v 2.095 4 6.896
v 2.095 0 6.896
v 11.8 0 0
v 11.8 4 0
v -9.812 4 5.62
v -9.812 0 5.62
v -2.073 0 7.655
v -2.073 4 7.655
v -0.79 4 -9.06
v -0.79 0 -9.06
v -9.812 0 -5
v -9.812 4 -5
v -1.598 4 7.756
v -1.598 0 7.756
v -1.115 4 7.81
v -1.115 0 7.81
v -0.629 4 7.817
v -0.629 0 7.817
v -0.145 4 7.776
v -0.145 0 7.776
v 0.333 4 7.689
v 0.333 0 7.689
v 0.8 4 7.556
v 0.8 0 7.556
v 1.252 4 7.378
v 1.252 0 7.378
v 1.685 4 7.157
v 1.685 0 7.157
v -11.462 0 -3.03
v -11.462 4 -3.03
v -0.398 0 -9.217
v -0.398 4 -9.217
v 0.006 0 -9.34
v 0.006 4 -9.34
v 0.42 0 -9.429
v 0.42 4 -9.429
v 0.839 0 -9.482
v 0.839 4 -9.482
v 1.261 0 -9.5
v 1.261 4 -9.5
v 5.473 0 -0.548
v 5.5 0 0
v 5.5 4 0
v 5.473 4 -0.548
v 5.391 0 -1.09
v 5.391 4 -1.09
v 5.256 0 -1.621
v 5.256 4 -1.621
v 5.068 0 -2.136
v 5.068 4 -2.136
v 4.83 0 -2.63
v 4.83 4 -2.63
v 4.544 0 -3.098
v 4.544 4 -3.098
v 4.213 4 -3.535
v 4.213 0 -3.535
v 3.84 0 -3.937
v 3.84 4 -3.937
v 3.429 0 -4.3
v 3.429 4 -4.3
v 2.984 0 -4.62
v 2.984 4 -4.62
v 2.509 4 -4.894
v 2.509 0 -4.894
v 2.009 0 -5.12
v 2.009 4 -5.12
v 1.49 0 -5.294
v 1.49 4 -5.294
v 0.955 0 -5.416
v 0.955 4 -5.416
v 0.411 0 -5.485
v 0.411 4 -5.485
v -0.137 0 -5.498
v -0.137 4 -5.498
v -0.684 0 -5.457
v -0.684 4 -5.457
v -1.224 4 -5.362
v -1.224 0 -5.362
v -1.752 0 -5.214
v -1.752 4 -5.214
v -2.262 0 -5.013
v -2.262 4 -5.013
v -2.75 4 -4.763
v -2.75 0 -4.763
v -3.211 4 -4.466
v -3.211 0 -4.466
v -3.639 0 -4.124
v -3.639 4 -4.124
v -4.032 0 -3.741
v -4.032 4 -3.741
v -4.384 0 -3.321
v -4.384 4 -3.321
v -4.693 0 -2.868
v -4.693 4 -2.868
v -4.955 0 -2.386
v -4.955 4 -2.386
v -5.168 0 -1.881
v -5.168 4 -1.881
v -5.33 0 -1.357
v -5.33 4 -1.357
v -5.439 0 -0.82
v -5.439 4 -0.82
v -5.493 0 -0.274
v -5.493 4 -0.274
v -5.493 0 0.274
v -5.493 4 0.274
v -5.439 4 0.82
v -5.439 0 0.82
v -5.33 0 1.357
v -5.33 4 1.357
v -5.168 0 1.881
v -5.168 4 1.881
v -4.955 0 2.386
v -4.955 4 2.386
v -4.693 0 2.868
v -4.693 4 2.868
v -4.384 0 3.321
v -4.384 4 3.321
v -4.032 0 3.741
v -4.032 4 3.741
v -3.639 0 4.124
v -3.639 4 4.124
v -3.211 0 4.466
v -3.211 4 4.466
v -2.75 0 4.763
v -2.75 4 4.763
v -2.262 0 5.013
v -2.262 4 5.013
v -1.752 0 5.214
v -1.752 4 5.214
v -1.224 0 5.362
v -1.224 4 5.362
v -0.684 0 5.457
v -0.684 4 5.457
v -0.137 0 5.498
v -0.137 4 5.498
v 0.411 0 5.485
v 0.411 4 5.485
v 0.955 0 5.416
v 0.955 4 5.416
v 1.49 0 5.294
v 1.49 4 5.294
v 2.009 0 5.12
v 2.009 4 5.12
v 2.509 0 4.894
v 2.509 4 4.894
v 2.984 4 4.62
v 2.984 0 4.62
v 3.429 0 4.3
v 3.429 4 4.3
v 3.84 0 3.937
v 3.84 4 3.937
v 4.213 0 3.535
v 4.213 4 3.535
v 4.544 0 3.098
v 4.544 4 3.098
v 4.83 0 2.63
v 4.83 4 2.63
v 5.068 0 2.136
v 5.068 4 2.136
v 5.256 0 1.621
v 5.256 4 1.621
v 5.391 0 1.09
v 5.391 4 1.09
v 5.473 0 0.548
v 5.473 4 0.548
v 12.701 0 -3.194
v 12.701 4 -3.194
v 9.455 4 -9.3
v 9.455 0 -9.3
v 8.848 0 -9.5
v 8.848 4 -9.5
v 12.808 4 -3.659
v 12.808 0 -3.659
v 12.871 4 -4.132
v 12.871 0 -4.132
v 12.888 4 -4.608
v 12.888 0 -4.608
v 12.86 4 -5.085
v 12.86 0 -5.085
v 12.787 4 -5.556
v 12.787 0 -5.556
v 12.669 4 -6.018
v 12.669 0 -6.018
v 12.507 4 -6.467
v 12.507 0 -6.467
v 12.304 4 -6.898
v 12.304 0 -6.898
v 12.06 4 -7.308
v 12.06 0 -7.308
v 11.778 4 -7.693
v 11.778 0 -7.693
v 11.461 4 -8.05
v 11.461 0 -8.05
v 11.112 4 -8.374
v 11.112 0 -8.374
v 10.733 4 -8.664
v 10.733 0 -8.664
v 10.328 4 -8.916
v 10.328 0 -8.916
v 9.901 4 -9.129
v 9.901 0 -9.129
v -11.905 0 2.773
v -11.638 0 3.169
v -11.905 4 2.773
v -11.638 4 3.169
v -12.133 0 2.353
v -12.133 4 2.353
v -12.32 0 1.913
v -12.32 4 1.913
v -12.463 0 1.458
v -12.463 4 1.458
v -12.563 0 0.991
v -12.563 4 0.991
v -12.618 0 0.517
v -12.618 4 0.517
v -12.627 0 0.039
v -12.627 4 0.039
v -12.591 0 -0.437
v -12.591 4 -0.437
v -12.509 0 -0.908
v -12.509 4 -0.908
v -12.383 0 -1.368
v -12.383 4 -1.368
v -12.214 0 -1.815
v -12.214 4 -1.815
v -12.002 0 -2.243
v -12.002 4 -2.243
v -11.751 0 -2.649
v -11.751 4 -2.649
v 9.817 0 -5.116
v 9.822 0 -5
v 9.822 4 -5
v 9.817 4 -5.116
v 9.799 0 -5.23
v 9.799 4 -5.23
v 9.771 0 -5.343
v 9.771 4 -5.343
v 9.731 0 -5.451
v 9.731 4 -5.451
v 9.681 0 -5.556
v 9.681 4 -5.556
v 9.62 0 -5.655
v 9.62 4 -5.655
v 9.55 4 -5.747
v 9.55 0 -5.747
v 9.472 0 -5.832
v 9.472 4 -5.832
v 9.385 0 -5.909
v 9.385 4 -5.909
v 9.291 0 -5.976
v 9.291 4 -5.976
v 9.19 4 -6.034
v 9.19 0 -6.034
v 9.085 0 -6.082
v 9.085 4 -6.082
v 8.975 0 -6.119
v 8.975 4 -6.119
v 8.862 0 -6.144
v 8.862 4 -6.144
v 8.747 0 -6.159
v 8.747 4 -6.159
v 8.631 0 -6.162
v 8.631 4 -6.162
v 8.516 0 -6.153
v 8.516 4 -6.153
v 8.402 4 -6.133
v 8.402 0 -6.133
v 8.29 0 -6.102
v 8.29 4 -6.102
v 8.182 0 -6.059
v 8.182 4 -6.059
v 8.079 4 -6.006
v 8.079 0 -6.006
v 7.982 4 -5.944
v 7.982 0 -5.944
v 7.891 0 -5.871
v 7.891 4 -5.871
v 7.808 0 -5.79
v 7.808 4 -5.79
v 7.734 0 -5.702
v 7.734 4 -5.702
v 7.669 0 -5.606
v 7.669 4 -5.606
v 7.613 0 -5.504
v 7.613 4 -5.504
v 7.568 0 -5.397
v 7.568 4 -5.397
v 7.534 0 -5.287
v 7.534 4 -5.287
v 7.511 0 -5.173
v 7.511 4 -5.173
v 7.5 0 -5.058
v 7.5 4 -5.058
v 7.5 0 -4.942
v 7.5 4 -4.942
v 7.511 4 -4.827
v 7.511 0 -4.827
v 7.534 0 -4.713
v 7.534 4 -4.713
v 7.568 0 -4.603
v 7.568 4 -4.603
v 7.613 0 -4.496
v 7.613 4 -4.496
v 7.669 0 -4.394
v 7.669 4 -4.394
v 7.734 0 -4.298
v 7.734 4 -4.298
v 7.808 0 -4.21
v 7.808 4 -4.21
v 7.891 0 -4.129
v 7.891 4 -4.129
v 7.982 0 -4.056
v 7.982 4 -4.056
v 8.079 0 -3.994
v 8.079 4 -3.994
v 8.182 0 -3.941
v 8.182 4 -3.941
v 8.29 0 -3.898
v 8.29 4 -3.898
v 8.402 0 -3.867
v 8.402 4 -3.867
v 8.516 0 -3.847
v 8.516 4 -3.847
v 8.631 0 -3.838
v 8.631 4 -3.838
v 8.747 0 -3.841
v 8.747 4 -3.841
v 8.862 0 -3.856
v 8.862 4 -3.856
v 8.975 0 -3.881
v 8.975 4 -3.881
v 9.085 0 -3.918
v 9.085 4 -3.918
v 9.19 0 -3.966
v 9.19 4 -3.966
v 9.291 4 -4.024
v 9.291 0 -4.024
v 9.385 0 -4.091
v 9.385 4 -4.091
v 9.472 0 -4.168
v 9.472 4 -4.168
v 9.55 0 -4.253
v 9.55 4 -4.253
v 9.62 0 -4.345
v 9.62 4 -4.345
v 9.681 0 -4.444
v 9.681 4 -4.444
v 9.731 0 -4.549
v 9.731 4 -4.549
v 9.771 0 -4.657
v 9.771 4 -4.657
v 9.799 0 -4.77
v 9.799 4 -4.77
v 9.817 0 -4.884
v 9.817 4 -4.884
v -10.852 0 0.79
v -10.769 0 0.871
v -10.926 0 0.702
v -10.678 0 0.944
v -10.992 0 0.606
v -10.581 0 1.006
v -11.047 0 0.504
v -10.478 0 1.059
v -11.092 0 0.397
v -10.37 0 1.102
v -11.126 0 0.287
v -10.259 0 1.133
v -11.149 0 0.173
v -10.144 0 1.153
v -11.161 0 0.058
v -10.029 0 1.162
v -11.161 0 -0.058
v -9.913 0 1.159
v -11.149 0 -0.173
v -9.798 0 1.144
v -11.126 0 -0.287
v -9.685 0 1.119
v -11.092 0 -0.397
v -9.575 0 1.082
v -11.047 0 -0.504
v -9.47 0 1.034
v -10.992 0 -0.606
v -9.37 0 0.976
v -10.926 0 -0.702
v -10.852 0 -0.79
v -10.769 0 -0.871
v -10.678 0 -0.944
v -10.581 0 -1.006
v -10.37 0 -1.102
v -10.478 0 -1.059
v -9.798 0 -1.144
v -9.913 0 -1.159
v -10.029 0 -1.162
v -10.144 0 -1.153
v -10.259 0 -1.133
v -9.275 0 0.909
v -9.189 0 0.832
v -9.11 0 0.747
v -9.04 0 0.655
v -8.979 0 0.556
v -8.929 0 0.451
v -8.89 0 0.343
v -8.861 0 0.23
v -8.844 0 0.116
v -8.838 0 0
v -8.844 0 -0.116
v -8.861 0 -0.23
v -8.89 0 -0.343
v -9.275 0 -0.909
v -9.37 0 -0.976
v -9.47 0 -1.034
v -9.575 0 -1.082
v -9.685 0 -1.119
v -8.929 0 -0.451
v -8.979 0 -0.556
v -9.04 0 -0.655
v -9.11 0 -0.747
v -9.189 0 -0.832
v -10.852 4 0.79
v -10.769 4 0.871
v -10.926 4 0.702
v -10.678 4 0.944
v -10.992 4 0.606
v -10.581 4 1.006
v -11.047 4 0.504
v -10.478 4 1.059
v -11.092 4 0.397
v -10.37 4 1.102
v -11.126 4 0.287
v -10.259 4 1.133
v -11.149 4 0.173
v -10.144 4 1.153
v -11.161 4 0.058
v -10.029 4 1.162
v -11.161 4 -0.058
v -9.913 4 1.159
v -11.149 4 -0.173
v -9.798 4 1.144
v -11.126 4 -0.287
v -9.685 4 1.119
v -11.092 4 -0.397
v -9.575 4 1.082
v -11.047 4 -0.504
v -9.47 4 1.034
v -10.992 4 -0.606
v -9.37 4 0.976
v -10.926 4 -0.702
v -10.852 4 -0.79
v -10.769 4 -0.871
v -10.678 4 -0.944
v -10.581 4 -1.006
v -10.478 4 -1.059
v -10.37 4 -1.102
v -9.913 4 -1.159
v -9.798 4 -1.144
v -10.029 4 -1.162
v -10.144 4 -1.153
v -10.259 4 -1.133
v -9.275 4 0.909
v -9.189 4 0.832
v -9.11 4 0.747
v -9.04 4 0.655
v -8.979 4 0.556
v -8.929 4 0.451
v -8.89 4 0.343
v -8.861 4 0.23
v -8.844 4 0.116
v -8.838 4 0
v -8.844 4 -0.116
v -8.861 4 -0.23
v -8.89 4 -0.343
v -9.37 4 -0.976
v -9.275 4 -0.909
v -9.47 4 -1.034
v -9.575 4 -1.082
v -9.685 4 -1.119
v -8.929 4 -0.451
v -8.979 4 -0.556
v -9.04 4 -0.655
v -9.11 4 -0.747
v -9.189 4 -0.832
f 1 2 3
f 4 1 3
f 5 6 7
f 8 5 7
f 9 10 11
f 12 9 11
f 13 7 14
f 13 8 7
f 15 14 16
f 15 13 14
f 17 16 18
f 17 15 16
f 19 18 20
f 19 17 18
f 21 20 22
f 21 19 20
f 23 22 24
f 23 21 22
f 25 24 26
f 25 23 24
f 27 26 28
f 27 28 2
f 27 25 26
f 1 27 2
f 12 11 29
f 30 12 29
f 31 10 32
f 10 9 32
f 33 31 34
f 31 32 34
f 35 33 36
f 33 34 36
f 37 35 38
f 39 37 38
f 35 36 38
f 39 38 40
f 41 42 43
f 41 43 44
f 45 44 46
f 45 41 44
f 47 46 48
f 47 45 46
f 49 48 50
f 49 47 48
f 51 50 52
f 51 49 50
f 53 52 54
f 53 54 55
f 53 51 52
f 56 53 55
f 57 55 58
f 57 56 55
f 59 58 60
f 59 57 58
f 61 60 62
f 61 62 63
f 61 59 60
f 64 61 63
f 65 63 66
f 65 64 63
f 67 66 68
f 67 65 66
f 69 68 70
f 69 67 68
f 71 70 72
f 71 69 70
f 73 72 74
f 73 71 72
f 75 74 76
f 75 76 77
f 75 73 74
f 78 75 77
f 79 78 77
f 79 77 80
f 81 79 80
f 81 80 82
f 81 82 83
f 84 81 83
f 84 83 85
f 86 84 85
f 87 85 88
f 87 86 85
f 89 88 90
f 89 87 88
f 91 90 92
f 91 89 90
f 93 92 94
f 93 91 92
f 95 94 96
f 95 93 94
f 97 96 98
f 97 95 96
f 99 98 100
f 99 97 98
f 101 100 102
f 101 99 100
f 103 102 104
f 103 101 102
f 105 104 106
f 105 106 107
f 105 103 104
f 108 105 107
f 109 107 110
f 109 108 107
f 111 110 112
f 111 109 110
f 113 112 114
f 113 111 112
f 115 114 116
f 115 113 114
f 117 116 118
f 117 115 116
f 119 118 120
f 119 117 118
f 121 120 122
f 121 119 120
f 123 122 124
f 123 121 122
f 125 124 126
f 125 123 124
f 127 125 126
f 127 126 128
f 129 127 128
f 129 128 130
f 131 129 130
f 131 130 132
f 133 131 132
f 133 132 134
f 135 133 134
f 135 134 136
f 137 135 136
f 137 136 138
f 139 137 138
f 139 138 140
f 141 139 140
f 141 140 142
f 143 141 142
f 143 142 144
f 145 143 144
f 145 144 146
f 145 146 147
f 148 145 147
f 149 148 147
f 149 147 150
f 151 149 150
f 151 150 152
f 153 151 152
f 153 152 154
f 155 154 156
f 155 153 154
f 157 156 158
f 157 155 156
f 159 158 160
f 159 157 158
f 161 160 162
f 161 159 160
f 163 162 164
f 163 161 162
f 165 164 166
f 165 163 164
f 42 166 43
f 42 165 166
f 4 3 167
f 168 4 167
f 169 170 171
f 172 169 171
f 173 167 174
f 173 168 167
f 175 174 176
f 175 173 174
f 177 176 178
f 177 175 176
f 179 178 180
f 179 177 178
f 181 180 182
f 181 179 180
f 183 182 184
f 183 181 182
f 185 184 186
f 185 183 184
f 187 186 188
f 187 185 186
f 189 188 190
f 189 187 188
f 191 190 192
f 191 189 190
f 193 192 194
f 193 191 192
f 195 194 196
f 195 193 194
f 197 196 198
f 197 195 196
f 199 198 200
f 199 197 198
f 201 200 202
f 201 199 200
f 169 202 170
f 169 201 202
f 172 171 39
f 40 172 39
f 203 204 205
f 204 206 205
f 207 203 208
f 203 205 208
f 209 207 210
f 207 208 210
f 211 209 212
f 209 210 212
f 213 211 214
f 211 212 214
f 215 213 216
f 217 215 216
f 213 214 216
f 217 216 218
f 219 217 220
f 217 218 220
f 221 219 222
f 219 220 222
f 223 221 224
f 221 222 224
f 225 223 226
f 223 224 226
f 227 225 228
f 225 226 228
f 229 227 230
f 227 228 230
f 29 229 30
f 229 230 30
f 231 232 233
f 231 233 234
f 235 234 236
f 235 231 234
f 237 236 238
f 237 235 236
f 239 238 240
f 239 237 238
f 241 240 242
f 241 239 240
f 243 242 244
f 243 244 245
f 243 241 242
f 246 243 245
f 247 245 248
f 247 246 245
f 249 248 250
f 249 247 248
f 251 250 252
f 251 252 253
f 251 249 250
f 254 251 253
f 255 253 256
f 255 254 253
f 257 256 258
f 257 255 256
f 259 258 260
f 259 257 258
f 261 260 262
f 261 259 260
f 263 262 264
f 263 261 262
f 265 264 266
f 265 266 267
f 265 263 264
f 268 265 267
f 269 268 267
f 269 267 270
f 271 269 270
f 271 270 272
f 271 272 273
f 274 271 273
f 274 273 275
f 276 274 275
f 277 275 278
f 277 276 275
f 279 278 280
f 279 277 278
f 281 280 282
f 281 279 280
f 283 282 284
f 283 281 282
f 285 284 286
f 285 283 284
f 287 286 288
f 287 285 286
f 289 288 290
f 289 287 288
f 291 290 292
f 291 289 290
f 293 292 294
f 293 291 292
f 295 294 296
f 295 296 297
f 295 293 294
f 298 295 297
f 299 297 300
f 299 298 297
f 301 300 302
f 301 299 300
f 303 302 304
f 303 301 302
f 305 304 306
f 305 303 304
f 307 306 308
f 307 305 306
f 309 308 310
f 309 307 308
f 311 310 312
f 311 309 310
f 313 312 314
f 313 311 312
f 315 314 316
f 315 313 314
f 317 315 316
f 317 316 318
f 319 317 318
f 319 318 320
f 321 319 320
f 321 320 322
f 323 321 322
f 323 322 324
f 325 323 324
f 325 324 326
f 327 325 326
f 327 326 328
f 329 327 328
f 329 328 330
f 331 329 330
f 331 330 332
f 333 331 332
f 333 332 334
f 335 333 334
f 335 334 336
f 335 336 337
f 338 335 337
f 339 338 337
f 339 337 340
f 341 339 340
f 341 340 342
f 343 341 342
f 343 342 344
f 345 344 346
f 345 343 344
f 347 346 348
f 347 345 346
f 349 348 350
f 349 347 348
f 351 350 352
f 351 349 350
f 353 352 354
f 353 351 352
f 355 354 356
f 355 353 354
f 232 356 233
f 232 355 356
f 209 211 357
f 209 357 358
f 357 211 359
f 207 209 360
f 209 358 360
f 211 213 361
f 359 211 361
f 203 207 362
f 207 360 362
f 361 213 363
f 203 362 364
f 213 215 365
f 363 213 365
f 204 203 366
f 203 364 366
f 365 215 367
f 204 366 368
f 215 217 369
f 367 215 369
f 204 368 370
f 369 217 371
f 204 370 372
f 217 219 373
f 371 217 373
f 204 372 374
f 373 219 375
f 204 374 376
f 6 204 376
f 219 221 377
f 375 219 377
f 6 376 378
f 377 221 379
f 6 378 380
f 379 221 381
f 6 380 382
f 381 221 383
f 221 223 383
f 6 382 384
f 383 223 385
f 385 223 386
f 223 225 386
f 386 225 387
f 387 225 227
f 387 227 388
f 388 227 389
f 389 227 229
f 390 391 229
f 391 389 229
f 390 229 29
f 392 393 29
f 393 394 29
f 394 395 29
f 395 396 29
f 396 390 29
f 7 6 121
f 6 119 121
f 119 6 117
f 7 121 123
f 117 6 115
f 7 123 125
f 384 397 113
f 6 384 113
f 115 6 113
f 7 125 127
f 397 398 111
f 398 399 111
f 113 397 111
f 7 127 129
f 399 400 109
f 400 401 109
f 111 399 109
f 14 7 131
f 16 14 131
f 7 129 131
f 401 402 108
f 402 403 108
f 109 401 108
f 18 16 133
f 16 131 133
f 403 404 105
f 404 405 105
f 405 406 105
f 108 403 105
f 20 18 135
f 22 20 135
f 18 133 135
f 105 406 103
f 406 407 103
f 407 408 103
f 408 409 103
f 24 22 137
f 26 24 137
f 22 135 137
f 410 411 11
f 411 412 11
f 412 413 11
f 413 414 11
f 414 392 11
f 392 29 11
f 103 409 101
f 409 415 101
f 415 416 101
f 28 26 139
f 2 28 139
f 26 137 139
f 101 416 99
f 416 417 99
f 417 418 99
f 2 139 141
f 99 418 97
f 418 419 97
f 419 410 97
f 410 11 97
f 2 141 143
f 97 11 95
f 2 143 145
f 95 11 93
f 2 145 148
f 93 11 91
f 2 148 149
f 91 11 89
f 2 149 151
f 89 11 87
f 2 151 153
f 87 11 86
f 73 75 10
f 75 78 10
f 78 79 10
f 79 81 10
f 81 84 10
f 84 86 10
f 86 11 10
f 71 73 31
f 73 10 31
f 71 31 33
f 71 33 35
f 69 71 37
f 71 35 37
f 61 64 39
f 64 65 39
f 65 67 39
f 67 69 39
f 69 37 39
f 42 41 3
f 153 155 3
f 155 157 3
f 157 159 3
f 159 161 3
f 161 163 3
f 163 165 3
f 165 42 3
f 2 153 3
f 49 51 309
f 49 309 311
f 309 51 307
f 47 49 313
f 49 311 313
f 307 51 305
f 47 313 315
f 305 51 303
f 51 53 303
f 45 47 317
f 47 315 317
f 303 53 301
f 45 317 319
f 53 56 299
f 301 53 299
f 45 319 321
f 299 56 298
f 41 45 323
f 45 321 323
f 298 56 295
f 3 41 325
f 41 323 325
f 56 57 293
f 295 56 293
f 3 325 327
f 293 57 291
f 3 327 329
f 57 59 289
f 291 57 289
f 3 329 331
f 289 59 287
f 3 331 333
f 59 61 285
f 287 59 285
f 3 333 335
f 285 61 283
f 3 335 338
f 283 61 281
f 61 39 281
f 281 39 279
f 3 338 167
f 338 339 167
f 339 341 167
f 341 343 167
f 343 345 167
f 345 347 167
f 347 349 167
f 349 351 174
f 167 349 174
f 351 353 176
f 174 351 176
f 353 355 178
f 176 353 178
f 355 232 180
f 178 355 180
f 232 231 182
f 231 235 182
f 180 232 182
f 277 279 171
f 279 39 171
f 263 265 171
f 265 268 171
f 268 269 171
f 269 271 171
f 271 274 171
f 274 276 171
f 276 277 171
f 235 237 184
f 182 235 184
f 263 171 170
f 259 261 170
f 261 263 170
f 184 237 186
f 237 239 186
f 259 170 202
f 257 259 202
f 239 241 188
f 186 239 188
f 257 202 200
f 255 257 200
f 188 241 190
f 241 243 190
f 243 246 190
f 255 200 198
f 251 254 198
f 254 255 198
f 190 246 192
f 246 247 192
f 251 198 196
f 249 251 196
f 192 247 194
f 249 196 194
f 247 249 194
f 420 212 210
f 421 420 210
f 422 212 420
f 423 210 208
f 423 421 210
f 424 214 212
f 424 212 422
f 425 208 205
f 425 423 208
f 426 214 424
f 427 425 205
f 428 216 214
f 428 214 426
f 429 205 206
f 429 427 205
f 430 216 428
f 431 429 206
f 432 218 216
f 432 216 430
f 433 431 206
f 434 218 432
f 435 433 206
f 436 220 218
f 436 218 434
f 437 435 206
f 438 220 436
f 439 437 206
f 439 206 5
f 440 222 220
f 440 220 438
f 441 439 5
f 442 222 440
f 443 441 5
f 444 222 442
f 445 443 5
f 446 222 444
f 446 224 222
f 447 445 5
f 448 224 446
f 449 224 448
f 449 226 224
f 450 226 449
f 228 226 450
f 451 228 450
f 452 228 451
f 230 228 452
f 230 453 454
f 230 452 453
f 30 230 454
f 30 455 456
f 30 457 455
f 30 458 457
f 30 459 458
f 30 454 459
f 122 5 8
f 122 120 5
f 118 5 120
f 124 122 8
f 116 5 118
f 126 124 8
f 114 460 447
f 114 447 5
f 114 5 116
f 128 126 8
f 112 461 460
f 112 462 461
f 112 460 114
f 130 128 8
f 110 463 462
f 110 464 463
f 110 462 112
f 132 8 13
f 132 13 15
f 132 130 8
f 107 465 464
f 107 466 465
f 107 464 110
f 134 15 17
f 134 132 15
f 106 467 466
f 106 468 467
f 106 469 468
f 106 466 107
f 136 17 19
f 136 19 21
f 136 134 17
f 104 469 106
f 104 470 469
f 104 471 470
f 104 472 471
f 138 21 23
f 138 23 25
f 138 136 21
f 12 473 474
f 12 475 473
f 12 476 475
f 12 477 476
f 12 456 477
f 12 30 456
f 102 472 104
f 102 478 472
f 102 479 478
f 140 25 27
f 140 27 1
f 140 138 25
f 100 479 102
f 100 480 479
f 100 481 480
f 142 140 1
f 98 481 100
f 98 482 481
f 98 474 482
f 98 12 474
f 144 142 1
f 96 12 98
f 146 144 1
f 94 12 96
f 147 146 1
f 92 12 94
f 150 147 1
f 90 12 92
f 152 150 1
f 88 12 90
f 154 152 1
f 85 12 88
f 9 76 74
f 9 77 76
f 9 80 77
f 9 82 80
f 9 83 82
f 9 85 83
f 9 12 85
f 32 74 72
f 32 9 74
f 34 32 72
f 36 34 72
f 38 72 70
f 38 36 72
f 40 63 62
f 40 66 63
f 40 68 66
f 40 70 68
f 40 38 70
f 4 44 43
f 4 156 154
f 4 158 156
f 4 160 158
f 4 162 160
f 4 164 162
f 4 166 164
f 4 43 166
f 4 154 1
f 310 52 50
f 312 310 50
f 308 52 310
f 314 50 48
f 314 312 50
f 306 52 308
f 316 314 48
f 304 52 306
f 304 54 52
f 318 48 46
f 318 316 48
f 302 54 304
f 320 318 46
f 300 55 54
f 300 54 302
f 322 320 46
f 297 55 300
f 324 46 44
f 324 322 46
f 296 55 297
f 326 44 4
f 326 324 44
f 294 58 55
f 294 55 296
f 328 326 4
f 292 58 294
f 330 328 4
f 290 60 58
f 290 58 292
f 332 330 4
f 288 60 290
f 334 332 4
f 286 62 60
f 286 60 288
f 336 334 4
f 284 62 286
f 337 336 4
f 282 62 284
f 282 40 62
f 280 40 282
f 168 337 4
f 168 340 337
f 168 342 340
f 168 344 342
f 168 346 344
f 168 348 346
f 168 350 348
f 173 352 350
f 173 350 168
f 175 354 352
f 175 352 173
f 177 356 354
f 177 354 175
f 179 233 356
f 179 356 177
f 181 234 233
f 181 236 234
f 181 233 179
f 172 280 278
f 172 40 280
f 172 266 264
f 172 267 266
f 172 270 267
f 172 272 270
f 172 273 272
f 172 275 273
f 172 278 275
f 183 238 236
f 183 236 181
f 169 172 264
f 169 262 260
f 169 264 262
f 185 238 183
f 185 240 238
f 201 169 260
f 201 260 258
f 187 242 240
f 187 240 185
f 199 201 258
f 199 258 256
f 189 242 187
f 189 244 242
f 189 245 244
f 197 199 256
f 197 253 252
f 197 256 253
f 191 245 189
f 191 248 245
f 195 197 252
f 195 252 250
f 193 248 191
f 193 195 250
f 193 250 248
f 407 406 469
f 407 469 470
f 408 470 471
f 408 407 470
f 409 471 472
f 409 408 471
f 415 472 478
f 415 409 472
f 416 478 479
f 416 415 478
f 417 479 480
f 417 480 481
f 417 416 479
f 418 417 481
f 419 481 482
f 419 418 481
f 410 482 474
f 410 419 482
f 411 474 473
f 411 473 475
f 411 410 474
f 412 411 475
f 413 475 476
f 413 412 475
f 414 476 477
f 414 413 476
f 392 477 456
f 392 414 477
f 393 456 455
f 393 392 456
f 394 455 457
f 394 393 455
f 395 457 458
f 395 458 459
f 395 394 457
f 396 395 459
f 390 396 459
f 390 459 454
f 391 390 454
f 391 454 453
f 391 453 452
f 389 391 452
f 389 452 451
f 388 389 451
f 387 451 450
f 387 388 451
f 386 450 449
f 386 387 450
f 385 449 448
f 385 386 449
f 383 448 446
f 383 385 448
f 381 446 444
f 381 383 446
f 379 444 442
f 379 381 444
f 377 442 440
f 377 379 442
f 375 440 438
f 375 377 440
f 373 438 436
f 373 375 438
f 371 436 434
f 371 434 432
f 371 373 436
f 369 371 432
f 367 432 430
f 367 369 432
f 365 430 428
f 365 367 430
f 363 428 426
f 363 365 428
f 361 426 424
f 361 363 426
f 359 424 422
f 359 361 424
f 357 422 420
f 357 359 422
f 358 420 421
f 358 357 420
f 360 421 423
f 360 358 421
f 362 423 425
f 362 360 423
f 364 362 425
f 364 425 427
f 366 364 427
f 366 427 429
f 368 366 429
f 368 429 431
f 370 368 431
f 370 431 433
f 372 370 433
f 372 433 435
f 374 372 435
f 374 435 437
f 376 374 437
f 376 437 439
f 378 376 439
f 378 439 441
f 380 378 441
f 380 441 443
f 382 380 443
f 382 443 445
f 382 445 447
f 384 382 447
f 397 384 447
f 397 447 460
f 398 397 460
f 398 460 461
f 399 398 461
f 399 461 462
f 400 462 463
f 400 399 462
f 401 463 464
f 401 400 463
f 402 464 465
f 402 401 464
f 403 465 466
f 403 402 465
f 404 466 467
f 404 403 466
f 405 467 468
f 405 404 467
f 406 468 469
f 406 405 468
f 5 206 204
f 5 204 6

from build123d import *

# Parameters (mm, degrees)
SKETCH1_R           = 5.5
SKETCH1_R_2         = 1.16205649
BOSS_EXTRUDE1_DEPTH = 4
FILLET1_R           = 5


with BuildPart() as part:
    # Sketch1 → Boss-Extrude1 (new body)
    with BuildSketch(Plane(origin=(0, 0, 0), x_dir=(1, 0, 0), z_dir=(0, 1, 0))):
        Polygon((-9.811758465, -5.619740701), (0.188241535, -8.249999209), (11.79974155, 0), (14, 7.8), (8.848495573, 9.5), (0.188241535, 9.5), (-9.811758465, 5), (-14, 0), align=None)
        Circle(SKETCH1_R, mode=Mode.SUBTRACT)
        with Locations((-10, 0)):
            Circle(SKETCH1_R_2, mode=Mode.SUBTRACT)
        with Locations((8.660254038, 5)):
            Circle(SKETCH1_R_2, mode=Mode.SUBTRACT)
    extrude(amount=BOSS_EXTRUDE1_DEPTH)

    # Fillet1
    fillet1_edges = [part.edges().sort_by_distance(p)[0] for p in [
        (-14, 2, 0),
        (0.188241535, 2, -9.5),
        (14, 2, -7.8),
        (0.188241535, 2, 8.249999209),
    ]]
    fillet(fillet1_edges, radius=FILLET1_R)


solid = part.part
